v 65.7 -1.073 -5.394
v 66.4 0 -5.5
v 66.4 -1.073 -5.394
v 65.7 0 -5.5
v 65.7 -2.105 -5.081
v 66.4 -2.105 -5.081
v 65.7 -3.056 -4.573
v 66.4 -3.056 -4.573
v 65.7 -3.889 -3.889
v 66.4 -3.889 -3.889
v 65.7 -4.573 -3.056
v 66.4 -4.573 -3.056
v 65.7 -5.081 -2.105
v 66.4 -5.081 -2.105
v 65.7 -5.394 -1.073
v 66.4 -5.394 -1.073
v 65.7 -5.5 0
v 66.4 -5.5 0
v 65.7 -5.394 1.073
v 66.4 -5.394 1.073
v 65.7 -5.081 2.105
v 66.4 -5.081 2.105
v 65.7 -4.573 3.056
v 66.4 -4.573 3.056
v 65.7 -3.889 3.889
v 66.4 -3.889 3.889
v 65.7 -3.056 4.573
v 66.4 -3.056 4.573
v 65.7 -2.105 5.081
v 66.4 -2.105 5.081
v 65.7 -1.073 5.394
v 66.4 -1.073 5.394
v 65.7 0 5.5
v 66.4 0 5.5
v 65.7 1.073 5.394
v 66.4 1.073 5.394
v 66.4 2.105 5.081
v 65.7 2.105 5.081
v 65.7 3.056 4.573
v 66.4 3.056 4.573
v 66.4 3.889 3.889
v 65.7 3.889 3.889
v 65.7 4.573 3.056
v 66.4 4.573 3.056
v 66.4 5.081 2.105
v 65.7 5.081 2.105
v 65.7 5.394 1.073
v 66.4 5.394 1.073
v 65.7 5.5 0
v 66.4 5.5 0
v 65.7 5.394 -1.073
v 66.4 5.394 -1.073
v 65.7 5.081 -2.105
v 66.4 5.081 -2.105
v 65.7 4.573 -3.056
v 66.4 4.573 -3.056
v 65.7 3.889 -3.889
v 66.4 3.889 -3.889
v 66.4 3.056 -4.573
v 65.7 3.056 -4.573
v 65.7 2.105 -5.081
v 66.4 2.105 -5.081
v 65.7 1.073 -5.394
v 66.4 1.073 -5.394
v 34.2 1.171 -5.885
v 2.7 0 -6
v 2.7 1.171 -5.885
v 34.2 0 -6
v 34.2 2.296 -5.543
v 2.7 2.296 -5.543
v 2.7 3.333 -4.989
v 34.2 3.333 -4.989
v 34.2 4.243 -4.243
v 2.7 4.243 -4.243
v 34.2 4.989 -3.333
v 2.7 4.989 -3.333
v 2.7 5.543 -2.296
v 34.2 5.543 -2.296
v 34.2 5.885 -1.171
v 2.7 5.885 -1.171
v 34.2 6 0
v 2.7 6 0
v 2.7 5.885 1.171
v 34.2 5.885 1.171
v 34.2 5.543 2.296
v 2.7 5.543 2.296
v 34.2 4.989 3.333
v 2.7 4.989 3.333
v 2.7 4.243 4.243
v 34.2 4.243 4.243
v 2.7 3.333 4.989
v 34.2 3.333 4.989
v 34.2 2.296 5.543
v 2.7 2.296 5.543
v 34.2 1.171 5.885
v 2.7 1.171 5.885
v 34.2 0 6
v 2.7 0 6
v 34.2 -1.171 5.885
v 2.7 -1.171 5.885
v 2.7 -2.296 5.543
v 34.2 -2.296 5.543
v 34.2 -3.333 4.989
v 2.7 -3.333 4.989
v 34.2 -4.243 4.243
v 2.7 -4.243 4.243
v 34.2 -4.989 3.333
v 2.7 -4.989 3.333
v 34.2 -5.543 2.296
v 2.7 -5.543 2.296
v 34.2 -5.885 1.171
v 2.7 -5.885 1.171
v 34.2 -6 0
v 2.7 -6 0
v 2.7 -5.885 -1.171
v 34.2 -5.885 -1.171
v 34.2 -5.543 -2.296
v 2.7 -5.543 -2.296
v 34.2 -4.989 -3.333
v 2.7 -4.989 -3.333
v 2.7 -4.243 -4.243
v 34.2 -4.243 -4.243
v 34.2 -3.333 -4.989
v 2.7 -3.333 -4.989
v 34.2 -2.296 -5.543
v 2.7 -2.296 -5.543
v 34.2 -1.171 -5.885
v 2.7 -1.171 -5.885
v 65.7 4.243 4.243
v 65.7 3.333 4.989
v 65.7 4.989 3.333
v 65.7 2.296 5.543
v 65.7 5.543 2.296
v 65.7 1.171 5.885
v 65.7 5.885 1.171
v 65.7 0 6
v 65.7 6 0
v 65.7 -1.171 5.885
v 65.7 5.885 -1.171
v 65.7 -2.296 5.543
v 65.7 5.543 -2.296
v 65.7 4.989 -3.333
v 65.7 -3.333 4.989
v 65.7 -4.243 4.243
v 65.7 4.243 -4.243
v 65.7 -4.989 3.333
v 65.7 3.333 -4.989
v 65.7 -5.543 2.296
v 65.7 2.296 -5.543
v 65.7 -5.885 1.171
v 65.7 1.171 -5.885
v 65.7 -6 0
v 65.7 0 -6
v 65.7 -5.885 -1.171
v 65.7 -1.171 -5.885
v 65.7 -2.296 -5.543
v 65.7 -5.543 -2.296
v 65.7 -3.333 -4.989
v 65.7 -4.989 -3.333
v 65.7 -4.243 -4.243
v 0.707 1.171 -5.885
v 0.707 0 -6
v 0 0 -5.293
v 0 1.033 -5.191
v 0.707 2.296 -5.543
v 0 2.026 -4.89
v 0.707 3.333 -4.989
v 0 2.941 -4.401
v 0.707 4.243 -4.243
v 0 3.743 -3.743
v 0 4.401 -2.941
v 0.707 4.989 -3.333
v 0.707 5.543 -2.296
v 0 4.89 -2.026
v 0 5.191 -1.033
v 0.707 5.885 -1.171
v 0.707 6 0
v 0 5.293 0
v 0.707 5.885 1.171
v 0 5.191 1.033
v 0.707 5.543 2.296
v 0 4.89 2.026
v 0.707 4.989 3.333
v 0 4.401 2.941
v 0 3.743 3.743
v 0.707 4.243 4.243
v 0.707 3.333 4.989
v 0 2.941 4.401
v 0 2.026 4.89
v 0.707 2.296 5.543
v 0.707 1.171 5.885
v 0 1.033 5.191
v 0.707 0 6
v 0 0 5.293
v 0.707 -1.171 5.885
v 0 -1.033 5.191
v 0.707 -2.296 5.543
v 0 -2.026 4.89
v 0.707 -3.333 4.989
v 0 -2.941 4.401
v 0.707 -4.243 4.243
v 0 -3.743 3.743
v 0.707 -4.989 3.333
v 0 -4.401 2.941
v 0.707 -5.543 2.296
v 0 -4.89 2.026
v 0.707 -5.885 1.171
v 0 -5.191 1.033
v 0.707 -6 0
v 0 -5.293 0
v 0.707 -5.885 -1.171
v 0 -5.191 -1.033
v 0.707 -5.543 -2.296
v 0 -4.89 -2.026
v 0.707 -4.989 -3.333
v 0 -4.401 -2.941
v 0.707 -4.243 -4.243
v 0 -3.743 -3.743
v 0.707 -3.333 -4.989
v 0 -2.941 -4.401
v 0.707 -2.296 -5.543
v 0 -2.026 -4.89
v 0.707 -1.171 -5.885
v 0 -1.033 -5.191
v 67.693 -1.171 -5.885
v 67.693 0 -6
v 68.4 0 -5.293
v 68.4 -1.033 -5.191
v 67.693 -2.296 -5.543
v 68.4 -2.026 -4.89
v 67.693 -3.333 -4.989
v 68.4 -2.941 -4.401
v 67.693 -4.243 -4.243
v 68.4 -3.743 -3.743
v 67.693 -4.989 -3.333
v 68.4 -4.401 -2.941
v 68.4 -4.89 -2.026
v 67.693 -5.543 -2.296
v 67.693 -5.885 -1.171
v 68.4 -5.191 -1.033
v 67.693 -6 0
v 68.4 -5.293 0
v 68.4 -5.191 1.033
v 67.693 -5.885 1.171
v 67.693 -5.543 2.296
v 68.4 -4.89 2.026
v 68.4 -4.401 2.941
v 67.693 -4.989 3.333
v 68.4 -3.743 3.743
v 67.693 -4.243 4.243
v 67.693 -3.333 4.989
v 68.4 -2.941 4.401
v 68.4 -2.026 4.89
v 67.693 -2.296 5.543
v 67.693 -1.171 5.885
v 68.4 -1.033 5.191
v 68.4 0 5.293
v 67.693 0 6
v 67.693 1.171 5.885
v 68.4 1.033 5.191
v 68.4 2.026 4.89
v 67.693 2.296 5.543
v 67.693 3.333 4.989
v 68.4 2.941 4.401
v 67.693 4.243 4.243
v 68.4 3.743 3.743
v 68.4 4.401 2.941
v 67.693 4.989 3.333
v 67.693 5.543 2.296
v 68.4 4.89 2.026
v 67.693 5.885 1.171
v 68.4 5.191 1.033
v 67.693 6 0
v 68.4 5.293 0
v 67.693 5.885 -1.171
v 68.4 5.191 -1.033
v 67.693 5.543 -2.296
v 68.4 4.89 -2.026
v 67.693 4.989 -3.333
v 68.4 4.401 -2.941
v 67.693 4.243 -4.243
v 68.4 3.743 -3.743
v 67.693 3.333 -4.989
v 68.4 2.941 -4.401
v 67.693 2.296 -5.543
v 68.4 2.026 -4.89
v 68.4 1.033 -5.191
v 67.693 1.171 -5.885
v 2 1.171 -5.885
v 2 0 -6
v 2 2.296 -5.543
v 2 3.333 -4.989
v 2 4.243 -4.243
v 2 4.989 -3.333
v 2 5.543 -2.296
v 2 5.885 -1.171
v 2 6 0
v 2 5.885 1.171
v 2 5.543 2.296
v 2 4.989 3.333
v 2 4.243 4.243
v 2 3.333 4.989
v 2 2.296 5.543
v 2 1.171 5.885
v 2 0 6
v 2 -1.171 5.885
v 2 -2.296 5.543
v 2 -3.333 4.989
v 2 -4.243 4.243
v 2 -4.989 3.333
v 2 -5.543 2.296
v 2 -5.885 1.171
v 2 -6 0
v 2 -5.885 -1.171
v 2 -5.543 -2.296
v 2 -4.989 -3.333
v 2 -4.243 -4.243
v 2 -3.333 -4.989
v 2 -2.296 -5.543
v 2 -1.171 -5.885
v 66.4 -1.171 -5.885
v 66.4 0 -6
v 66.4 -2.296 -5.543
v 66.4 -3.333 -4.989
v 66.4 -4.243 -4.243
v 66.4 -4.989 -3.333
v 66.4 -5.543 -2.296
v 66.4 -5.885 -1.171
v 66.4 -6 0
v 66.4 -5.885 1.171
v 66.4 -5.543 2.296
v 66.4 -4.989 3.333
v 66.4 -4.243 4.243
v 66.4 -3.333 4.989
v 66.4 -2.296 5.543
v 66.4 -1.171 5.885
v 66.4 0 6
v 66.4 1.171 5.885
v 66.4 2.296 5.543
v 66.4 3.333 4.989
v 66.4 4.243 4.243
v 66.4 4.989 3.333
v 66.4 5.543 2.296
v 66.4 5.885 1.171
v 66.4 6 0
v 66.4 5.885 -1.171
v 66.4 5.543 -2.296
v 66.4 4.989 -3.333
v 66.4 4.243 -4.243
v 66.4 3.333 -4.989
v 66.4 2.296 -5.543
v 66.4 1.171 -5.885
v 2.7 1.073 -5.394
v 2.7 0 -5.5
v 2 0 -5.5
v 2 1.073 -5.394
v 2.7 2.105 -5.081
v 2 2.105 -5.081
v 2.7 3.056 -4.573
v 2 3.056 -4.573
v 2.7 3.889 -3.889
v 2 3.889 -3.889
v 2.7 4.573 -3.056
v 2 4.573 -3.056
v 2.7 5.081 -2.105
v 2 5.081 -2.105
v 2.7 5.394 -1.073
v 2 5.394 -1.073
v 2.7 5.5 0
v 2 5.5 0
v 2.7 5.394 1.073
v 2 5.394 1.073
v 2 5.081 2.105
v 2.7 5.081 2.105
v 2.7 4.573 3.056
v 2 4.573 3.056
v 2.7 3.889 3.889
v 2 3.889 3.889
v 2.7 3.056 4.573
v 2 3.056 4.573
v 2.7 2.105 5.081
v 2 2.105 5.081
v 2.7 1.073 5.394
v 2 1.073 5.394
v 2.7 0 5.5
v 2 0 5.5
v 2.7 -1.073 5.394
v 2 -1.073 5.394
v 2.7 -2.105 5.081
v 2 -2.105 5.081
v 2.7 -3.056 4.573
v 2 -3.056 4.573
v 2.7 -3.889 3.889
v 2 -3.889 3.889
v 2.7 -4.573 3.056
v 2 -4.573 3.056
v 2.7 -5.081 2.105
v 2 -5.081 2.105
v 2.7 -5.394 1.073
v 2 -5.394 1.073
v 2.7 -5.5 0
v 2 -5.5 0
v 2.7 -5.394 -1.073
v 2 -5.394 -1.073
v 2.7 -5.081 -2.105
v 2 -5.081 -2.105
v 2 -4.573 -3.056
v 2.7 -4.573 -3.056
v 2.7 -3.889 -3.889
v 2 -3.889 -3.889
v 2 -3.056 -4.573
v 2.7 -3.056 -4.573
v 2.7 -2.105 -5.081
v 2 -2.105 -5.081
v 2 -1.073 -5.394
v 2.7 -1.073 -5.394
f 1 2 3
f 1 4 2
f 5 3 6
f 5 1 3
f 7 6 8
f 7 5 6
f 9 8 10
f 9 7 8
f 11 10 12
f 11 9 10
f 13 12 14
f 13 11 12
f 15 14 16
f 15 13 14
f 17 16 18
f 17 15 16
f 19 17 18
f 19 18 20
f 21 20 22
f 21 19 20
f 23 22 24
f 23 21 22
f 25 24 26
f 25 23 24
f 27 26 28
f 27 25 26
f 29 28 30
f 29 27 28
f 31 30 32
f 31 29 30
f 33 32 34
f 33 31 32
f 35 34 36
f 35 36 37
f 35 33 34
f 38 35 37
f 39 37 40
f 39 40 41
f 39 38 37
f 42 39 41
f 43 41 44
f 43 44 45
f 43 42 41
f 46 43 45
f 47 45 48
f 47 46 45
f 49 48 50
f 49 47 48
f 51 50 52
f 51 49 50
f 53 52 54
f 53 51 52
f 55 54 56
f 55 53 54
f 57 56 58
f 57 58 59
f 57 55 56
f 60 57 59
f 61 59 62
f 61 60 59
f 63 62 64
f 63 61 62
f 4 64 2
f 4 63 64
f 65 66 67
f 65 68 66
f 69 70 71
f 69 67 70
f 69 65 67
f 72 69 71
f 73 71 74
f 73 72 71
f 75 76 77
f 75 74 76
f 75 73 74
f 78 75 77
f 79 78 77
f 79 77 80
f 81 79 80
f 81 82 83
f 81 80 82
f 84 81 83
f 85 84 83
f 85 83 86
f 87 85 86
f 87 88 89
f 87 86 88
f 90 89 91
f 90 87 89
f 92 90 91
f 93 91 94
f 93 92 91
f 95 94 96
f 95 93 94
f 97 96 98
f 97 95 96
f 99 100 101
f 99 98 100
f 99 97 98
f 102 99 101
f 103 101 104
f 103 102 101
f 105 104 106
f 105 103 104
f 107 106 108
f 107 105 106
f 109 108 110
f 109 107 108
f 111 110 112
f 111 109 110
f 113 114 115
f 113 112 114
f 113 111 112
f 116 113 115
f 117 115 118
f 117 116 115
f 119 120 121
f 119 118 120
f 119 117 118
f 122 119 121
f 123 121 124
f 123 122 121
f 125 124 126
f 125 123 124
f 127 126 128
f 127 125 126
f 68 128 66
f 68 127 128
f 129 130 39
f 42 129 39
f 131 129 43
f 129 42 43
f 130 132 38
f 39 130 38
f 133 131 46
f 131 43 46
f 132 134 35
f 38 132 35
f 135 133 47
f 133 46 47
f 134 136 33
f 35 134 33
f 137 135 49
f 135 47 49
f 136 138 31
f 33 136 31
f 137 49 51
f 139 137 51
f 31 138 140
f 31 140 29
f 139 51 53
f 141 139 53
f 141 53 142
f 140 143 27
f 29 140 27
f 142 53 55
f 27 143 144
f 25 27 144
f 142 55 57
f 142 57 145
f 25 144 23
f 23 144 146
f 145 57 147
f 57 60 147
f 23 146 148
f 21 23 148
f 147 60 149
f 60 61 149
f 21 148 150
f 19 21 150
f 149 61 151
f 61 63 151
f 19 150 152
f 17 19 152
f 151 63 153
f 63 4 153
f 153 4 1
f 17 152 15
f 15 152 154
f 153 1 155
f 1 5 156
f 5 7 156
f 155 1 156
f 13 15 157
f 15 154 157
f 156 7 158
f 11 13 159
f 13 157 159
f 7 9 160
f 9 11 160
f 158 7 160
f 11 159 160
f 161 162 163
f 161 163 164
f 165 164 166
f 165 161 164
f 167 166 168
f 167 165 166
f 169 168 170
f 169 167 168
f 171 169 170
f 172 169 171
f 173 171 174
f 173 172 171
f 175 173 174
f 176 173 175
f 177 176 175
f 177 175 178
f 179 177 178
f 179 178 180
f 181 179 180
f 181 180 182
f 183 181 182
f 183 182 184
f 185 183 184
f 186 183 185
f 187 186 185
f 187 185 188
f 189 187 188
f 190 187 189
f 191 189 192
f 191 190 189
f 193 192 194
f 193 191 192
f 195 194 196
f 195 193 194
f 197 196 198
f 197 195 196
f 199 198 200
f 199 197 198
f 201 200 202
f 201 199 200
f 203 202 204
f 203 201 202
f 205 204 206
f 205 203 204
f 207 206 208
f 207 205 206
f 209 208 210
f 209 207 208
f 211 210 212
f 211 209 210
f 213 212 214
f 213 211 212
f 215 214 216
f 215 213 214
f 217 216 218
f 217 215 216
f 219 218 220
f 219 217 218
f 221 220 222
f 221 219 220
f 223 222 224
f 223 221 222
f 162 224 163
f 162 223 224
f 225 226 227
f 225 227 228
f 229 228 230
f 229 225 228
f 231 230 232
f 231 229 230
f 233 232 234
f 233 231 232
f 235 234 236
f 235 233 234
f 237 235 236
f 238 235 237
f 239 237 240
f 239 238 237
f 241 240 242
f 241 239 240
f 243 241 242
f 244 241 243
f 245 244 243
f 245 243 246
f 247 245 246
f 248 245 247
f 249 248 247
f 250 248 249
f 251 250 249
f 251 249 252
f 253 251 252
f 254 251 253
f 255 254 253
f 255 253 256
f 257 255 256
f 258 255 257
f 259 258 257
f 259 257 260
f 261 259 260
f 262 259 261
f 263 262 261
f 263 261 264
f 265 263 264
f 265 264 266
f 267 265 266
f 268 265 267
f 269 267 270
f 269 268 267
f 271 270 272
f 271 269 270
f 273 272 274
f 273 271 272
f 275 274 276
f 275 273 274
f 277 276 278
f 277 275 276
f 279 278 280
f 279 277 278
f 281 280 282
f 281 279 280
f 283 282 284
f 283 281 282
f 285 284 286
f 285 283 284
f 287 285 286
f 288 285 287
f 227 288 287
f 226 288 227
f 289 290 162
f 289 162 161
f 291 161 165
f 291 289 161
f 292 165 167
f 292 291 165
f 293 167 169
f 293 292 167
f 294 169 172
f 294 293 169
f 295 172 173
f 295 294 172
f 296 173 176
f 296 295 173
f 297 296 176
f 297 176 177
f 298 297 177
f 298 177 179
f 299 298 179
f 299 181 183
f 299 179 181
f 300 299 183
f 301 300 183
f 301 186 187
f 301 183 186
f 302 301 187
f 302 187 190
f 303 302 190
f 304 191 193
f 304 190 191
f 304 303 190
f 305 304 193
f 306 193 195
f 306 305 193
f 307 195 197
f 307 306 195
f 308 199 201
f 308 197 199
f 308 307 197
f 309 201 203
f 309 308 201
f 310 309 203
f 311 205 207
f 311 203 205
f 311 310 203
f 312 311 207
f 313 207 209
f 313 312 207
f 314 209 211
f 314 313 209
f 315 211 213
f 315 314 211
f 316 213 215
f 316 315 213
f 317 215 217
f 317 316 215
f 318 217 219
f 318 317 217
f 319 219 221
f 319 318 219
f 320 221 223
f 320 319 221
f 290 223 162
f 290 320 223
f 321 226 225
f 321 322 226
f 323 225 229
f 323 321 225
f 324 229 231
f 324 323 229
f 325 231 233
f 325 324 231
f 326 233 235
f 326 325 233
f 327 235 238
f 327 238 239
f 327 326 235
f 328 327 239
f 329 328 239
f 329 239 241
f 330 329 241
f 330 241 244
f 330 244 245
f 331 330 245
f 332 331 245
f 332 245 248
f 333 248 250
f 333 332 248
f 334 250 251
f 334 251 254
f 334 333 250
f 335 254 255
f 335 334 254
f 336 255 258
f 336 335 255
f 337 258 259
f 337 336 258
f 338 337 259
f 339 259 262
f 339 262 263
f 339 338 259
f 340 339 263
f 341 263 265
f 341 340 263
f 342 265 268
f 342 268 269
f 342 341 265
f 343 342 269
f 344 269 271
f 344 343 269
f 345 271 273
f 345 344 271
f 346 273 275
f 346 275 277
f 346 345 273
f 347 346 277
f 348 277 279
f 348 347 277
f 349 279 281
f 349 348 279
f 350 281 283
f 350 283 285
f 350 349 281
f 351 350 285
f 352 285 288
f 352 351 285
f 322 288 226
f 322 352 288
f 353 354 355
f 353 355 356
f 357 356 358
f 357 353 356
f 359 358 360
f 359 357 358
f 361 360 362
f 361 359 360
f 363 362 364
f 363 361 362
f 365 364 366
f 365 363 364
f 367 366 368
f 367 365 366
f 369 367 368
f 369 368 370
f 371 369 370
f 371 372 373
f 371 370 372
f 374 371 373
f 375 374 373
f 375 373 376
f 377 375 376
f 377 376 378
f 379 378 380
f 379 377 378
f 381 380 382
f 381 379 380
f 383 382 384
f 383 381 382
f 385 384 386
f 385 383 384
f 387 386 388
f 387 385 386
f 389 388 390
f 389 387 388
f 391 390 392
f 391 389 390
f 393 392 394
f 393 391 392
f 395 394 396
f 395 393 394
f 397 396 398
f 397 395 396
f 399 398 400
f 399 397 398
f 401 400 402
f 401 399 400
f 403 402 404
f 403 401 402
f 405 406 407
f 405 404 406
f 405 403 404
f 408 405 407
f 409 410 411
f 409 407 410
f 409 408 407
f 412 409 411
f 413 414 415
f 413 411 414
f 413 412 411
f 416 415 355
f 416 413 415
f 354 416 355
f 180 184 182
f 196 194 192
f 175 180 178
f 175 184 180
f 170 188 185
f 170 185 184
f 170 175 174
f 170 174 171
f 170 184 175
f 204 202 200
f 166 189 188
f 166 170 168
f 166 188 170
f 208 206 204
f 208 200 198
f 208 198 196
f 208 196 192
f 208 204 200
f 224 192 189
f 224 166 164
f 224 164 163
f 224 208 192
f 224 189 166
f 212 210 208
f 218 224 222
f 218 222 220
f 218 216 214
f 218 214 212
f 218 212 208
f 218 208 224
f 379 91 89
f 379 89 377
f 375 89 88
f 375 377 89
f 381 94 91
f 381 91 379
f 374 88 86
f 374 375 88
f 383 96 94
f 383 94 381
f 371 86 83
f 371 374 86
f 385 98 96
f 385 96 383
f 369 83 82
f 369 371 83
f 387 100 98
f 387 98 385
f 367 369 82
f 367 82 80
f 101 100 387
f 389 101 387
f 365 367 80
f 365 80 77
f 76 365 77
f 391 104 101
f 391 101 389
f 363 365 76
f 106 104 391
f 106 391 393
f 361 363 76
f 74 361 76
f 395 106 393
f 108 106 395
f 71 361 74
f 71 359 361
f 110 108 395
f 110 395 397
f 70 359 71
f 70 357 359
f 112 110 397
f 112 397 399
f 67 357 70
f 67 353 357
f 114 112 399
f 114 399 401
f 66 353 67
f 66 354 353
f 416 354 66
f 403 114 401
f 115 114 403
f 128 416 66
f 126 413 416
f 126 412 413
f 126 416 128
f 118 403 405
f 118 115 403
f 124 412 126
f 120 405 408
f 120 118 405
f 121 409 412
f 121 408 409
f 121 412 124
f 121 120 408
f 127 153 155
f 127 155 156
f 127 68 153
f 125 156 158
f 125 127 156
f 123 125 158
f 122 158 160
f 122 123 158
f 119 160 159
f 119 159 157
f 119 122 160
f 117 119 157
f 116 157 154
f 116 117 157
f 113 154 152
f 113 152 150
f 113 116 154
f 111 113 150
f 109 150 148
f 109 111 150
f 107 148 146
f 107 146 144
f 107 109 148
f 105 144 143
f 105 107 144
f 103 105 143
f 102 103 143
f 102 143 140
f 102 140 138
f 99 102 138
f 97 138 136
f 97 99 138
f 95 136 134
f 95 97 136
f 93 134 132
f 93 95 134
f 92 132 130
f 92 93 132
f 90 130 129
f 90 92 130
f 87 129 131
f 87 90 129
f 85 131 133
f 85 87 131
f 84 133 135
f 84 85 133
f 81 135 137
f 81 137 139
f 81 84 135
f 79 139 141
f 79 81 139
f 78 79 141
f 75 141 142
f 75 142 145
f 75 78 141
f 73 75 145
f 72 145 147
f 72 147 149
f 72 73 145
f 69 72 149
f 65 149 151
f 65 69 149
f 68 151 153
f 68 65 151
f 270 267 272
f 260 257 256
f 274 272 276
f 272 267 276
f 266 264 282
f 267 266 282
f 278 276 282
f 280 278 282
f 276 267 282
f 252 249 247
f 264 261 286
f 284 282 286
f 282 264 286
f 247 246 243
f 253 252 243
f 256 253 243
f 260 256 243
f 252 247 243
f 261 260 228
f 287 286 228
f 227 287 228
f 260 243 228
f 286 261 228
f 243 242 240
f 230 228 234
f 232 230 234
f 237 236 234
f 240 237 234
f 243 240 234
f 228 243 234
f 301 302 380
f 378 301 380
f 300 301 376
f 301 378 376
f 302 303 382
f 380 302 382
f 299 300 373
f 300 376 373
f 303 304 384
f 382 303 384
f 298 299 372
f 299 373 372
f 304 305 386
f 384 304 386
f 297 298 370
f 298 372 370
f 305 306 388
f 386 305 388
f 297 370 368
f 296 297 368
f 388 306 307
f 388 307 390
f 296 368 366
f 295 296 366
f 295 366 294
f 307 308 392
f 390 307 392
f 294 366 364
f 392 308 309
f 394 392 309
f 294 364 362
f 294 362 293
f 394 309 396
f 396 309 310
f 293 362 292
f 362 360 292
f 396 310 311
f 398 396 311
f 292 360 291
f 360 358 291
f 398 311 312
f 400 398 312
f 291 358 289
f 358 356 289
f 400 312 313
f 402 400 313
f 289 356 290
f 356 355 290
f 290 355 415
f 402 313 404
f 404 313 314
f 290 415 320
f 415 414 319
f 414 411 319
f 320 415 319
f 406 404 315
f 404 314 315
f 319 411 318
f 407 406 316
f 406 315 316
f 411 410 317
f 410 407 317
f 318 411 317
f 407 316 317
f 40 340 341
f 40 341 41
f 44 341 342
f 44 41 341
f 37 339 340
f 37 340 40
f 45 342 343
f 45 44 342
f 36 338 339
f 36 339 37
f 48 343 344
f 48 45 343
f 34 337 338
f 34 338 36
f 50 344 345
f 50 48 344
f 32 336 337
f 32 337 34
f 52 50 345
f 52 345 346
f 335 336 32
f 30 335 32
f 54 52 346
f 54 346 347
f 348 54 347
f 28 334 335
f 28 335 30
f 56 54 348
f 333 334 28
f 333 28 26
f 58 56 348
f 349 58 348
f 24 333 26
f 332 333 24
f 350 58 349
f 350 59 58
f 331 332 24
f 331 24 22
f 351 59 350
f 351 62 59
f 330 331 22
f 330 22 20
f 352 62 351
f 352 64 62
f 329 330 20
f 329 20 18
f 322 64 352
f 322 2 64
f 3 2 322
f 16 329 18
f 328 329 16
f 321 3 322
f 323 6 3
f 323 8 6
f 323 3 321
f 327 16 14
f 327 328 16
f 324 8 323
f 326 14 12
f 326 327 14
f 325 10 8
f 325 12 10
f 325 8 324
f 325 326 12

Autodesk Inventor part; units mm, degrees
ref_plane "YZ Plane" through (0, 0, 0) normal (1, 0, 0) x (0, 1, 0)
ref_plane "XZ Plane" through (0, 0, 0) normal (0, 1, 0) x (-1, 0, 0)
ref_plane "XY Plane" through (0, 0, 0) normal (0, 0, 1) x (1, 0, 0)
sketch "Sketch1" plane through (0, 0, 0) normal (0, 1, 0) x (-1, 0, 0)
  line L0 (0, 0) -> (0, -5.2929)
  line L1 (0, -5.2929) -> (-0.7071, -6)
  line L2 (-0.7071, -6) -> (-2, -6)
  line L3 (-2, -6) -> (-2, -5.5)
  line L4 (-2, -5.5) -> (-2.7, -5.5)
  line L5 (-2.7, -5.5) -> (-2.7, -6)
  line L6 (-2.7, -6) -> (-34.2, -6)
  line L7 (-34.2, -6) -> (-34.2, 0)
  line L8 (-34.2, 0) -> (0, 0)
  line L9 (-68.4, 0) -> (-68.4, -5.2929)
  line L10 (-68.4, -5.2929) -> (-67.6929, -6)
  line L11 (-67.6929, -6) -> (-66.4, -6)
  line L12 (-66.4, -6) -> (-66.4, -5.5)
  line L13 (-66.4, -5.5) -> (-65.7, -5.5)
  line L14 (-65.7, -5.5) -> (-65.7, -6)
  line L15 (-65.7, -6) -> (-34.2, -6)
  line L16 (-68.4, 0) -> (-34.2, 0)
  dimension "d0" = 6
  dimension "d1" = 0.7
  dimension "d2" = 2
  dimension "d3" = 0.5
  dimension "d4" = 135
  dimension "d5" = 1
  dimension "d8" = 31.5
revolve "Revolution1" add sketch "Sketch1" angle 360 about axis through (68.4, 0, 0) along (-1, 0, 0)
properties part number "Shatf_piston"
